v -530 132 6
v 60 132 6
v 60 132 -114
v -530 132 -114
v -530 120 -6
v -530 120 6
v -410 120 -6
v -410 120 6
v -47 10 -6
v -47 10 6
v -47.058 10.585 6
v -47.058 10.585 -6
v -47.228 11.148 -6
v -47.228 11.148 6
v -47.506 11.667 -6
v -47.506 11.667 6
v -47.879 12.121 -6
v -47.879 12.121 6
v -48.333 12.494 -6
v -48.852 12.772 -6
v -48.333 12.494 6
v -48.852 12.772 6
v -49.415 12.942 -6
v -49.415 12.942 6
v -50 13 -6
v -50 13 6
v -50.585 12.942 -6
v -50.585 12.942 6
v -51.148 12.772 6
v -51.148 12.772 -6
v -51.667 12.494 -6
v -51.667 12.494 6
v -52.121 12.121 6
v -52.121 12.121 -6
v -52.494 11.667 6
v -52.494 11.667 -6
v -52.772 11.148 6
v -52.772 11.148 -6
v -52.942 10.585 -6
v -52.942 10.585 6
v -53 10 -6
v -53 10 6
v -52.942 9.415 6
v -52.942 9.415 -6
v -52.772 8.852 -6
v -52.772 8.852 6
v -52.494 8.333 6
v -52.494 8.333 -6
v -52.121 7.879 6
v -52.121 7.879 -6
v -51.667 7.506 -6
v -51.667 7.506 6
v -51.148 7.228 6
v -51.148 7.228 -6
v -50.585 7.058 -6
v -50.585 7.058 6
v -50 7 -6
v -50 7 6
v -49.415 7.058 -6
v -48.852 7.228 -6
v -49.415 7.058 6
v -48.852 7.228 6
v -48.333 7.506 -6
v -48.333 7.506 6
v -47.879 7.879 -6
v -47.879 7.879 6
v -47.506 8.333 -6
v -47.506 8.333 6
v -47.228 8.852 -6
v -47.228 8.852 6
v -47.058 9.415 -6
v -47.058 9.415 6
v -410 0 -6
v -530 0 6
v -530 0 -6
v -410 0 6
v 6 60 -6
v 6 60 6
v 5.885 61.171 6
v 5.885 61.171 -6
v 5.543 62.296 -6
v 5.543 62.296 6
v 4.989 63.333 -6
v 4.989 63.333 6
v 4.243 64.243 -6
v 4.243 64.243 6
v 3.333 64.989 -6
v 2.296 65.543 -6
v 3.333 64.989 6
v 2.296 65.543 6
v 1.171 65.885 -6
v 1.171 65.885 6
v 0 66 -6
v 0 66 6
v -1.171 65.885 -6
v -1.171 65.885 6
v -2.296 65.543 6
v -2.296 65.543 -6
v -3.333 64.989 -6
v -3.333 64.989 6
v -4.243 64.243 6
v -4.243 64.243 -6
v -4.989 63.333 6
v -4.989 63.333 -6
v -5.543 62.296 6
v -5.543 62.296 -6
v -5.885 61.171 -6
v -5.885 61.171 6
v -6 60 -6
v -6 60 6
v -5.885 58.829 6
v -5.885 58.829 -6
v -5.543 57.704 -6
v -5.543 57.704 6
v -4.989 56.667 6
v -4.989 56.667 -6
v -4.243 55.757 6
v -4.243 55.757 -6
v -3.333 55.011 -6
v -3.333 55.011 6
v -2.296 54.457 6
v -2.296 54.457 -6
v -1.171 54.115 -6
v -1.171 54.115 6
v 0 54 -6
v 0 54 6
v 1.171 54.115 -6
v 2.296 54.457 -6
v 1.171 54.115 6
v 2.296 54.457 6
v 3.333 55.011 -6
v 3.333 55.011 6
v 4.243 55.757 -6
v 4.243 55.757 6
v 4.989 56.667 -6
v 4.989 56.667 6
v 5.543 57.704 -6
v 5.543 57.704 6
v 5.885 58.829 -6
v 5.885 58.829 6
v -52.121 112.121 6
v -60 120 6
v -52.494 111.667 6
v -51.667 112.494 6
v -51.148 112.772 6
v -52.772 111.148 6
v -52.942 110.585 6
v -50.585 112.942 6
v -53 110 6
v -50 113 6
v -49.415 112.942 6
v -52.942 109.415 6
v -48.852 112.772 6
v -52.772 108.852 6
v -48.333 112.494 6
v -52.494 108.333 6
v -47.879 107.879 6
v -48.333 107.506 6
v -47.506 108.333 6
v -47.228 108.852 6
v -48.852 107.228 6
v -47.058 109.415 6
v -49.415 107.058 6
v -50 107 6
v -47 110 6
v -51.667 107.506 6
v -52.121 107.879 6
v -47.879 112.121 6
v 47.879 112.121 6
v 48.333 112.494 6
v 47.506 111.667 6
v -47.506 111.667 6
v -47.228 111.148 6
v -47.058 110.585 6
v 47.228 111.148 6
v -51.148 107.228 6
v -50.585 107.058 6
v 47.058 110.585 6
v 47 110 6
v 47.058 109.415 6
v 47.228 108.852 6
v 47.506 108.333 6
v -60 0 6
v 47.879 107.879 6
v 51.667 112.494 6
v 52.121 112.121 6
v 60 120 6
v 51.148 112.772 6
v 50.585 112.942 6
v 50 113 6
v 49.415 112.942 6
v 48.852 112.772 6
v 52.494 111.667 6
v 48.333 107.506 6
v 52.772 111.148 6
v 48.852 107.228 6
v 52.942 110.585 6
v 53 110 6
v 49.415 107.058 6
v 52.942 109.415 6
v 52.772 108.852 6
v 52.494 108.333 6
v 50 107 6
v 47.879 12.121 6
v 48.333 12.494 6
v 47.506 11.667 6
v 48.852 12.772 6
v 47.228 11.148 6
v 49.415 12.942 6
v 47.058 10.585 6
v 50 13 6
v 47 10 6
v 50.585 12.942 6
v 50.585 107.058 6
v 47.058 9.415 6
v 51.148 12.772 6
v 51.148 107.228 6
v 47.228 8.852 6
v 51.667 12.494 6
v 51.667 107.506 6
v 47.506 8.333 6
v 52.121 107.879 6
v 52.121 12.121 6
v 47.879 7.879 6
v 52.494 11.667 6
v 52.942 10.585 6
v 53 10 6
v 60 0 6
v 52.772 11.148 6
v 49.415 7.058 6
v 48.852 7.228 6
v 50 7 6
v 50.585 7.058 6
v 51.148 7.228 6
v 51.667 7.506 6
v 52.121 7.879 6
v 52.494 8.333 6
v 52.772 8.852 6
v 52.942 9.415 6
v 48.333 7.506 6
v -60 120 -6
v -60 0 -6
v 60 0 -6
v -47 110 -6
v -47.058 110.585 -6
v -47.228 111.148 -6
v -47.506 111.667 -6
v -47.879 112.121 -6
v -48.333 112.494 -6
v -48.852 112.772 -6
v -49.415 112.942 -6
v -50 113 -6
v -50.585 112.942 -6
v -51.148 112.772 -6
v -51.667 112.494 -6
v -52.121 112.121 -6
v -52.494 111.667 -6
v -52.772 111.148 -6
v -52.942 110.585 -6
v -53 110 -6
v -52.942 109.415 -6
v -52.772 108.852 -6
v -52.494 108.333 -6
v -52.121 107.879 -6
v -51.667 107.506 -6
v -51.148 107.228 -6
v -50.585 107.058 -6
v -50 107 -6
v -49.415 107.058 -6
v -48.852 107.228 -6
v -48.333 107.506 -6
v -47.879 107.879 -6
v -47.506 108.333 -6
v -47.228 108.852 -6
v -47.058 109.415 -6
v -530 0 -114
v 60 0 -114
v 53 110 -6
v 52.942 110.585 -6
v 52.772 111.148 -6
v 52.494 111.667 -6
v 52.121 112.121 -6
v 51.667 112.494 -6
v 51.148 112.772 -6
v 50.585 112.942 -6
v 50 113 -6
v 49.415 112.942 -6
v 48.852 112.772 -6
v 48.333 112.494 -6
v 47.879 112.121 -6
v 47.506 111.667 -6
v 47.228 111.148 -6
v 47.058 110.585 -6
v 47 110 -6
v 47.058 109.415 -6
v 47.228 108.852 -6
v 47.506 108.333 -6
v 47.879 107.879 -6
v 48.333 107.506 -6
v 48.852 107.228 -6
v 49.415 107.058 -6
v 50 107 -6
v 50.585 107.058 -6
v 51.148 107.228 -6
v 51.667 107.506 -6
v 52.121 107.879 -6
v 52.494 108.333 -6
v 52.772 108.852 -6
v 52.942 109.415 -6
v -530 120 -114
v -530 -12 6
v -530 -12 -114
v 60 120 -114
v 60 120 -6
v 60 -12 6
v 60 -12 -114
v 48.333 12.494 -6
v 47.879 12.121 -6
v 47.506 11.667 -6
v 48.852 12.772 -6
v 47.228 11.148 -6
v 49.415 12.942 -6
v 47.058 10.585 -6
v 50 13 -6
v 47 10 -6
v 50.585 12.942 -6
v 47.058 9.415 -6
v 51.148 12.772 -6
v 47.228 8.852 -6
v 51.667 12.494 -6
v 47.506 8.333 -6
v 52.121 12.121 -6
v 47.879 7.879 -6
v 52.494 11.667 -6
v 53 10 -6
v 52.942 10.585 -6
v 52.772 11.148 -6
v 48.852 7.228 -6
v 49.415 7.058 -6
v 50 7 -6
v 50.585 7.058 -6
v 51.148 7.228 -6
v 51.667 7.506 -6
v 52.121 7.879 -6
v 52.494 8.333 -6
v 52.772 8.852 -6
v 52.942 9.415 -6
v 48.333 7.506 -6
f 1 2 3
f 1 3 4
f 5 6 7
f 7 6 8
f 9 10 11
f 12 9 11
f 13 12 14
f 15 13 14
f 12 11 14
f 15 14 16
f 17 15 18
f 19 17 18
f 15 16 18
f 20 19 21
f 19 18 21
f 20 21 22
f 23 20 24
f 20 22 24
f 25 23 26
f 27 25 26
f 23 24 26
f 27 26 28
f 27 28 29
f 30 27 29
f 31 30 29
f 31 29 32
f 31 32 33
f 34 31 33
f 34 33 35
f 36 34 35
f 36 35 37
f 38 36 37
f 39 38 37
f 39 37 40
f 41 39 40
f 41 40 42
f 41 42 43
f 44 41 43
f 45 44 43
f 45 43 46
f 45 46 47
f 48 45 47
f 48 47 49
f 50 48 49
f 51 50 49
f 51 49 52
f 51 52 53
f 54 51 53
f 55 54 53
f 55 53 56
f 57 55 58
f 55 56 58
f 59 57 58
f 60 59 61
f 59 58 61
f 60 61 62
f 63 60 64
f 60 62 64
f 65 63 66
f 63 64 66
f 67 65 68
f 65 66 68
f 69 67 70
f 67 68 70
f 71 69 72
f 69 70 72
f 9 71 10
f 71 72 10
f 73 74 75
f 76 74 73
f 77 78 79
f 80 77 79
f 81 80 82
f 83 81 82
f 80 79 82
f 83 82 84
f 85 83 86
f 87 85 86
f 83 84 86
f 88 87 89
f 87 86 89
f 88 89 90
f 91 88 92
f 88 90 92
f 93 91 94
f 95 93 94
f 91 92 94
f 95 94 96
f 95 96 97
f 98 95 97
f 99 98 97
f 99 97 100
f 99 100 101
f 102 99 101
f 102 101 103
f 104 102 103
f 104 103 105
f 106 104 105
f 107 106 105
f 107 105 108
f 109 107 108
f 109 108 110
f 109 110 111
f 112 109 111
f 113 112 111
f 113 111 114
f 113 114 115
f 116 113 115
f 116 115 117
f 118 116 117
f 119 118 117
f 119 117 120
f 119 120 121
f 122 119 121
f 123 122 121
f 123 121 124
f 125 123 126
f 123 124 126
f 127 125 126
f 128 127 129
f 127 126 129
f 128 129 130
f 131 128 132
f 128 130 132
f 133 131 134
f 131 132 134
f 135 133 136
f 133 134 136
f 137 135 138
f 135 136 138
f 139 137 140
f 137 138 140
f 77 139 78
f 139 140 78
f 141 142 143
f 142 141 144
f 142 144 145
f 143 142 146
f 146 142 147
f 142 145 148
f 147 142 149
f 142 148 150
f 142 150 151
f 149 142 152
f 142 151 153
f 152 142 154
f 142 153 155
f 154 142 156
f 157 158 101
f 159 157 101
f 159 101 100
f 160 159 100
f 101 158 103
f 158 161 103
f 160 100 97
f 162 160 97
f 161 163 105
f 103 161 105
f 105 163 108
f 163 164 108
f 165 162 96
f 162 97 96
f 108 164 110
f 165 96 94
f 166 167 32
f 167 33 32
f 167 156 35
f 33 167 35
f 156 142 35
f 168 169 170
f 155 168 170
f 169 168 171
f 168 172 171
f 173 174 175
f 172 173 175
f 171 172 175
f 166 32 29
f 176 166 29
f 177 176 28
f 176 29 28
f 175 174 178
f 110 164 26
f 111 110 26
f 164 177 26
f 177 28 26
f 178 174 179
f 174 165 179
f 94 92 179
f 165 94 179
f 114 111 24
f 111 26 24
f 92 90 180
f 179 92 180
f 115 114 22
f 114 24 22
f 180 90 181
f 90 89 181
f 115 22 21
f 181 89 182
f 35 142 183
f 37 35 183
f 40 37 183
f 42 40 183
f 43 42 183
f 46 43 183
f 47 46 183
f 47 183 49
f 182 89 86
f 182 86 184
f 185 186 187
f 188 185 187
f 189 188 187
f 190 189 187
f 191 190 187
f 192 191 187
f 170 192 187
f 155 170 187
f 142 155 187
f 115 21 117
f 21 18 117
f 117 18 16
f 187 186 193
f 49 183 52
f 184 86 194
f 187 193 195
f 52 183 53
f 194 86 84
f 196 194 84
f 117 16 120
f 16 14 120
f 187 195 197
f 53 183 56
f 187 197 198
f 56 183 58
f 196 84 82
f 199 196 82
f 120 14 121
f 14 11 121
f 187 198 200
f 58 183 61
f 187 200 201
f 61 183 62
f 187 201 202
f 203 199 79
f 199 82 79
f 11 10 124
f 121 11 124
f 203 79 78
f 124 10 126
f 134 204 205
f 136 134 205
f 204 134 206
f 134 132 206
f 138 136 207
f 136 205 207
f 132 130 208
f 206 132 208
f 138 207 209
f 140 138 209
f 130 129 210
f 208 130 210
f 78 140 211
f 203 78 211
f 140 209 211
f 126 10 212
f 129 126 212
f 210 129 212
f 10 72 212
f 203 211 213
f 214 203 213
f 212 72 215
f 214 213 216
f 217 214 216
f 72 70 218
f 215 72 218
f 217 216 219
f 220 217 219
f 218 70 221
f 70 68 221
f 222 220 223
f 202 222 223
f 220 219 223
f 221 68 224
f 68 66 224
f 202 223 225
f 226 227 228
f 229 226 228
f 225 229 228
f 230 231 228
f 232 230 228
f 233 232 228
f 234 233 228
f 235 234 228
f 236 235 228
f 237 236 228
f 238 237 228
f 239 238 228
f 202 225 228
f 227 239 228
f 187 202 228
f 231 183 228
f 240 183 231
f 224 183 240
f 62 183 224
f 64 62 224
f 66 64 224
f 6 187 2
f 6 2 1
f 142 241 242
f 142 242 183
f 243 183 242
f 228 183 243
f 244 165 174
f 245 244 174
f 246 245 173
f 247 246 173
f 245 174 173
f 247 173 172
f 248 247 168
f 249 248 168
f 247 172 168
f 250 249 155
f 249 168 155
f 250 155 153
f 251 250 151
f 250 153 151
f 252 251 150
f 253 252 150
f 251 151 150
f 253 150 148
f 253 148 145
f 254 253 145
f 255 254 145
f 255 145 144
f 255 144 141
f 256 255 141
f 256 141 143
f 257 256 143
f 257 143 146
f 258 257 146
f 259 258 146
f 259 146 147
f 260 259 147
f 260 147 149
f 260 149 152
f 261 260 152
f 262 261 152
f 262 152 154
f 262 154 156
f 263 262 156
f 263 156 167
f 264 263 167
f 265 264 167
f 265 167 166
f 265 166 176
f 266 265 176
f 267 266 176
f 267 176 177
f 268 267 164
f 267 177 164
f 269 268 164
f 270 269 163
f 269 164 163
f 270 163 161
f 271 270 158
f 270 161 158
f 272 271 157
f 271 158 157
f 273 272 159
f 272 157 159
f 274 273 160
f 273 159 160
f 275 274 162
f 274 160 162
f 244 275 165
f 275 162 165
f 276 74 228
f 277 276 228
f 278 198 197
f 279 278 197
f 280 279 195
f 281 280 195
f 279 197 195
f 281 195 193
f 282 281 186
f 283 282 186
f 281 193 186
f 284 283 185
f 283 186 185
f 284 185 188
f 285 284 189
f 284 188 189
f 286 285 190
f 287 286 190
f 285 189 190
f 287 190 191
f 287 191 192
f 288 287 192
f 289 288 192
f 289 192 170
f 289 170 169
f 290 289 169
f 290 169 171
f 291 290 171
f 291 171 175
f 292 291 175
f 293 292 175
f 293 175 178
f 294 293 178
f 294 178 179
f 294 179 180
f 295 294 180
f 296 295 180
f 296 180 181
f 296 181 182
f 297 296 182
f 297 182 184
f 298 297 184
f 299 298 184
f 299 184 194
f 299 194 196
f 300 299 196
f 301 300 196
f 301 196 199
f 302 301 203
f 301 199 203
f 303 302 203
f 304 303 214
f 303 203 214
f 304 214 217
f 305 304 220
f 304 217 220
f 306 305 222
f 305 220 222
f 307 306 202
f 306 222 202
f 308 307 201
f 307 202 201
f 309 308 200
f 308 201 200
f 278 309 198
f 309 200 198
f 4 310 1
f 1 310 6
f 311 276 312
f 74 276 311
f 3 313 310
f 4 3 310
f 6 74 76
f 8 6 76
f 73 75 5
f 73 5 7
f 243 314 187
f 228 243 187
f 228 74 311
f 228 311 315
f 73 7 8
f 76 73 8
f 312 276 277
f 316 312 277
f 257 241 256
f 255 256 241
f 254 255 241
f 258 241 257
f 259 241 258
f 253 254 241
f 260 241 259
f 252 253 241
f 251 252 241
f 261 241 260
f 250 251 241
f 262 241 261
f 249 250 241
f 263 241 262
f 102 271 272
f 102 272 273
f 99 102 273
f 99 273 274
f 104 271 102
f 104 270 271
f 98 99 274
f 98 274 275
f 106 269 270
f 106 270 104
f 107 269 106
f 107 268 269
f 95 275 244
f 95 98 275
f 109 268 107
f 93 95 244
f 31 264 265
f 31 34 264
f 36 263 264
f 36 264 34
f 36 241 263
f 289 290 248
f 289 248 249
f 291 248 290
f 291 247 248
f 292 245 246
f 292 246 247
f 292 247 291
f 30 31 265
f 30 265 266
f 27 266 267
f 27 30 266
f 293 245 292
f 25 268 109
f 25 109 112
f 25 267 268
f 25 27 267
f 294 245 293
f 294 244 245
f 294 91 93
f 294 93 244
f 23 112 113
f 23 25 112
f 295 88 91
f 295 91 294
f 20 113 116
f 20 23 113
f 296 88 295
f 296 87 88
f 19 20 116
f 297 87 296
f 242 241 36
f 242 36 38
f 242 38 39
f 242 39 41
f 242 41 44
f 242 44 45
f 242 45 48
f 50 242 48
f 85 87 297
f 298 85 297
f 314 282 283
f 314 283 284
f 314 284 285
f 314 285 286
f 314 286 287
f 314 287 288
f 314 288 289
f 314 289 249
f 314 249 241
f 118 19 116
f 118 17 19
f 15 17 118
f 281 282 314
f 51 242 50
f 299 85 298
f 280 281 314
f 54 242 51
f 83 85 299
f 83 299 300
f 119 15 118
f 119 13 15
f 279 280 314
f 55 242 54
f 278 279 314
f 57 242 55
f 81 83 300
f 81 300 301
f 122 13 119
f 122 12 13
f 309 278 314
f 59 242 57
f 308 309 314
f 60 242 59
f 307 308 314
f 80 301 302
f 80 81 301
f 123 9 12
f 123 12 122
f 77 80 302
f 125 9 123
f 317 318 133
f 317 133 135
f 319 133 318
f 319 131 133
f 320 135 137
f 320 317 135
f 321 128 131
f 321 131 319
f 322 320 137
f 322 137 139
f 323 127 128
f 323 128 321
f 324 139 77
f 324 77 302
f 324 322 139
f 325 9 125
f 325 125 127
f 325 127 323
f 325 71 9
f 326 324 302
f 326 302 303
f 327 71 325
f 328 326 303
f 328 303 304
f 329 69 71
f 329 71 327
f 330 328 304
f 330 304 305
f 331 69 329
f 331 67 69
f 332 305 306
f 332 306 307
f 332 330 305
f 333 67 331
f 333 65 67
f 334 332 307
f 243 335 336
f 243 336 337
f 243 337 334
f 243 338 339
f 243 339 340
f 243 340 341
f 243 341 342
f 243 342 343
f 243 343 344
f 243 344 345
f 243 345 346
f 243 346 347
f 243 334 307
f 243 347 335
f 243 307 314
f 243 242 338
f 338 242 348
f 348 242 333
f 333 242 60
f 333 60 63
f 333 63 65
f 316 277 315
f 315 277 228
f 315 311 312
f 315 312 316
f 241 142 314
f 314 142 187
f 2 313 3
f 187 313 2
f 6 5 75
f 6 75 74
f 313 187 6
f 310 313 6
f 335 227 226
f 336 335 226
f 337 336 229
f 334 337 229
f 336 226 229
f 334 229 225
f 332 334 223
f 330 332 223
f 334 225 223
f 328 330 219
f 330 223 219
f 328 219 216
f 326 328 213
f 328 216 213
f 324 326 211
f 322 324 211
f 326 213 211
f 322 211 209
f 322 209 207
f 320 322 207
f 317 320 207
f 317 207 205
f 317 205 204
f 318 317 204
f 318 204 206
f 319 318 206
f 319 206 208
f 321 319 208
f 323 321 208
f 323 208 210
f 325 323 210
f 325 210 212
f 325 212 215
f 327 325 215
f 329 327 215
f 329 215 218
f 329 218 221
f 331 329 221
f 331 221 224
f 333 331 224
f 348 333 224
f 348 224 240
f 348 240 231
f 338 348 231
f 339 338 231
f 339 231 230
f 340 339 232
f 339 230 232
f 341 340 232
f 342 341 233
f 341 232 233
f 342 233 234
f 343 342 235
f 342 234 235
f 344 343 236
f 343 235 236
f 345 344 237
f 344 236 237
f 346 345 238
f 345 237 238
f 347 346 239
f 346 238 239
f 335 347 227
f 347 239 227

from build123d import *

# Parameters (mm, degrees)
F0_W     = 120
F0_H     = 12
F1_DEPTH = 120
F2_W     = 590
F2_H     = 120
F3_DEPTH = 12
F4_W     = 120
F4_H     = 12
F5_DEPTH = 120
F6_W     = 590
F6_H     = 120
F7_DEPTH = 12
F8_R     = 3
F8_R_2   = 6
F9_DEPTH = 120.001


with BuildPart() as f1:
    # F0 (on Front) → F1 (new body)
    with BuildSketch(Plane.XZ):
        Rectangle(F0_W, F0_H)
    extrude(amount=-F1_DEPTH)

    # F8 (on face) → F9 (cut, through all)
    with BuildSketch(Plane.XY.offset(6)):
        with Locations((50, 110)):
            Circle(F8_R)
        with Locations((-50, 110)):
            Circle(F8_R)
        with Locations((-50, 10)):
            Circle(F8_R)
        with Locations((0, 60)):
            Circle(F8_R_2)
        with Locations((50, 10)):
            Circle(F8_R)
    extrude(amount=-F9_DEPTH, mode=Mode.SUBTRACT)


with BuildPart() as f3:
    # F2 (on Front) → F3 (new body)
    with BuildSketch(Plane.XZ):
        with Locations((-235, -54)):
            Rectangle(F2_W, F2_H)
    extrude(amount=F3_DEPTH)


with BuildPart() as f5:
    # F4 (on Front) → F5 (new body)
    with BuildSketch(Plane.XZ):
        with Locations((-470, 0)):
            Rectangle(F4_W, F4_H)
    extrude(amount=-F5_DEPTH)


with BuildPart() as f7:
    # F6 (on face) → F7 (new body)
    with BuildSketch(Plane(origin=(0, 120, 0), x_dir=(-1, 0, 0), z_dir=(0, 1, 0))):
        with Locations((235, -54)):
            Rectangle(F6_W, F6_H)
    extrude(amount=F7_DEPTH)


solid = Compound([f1.part, f3.part, f5.part, f7.part])
